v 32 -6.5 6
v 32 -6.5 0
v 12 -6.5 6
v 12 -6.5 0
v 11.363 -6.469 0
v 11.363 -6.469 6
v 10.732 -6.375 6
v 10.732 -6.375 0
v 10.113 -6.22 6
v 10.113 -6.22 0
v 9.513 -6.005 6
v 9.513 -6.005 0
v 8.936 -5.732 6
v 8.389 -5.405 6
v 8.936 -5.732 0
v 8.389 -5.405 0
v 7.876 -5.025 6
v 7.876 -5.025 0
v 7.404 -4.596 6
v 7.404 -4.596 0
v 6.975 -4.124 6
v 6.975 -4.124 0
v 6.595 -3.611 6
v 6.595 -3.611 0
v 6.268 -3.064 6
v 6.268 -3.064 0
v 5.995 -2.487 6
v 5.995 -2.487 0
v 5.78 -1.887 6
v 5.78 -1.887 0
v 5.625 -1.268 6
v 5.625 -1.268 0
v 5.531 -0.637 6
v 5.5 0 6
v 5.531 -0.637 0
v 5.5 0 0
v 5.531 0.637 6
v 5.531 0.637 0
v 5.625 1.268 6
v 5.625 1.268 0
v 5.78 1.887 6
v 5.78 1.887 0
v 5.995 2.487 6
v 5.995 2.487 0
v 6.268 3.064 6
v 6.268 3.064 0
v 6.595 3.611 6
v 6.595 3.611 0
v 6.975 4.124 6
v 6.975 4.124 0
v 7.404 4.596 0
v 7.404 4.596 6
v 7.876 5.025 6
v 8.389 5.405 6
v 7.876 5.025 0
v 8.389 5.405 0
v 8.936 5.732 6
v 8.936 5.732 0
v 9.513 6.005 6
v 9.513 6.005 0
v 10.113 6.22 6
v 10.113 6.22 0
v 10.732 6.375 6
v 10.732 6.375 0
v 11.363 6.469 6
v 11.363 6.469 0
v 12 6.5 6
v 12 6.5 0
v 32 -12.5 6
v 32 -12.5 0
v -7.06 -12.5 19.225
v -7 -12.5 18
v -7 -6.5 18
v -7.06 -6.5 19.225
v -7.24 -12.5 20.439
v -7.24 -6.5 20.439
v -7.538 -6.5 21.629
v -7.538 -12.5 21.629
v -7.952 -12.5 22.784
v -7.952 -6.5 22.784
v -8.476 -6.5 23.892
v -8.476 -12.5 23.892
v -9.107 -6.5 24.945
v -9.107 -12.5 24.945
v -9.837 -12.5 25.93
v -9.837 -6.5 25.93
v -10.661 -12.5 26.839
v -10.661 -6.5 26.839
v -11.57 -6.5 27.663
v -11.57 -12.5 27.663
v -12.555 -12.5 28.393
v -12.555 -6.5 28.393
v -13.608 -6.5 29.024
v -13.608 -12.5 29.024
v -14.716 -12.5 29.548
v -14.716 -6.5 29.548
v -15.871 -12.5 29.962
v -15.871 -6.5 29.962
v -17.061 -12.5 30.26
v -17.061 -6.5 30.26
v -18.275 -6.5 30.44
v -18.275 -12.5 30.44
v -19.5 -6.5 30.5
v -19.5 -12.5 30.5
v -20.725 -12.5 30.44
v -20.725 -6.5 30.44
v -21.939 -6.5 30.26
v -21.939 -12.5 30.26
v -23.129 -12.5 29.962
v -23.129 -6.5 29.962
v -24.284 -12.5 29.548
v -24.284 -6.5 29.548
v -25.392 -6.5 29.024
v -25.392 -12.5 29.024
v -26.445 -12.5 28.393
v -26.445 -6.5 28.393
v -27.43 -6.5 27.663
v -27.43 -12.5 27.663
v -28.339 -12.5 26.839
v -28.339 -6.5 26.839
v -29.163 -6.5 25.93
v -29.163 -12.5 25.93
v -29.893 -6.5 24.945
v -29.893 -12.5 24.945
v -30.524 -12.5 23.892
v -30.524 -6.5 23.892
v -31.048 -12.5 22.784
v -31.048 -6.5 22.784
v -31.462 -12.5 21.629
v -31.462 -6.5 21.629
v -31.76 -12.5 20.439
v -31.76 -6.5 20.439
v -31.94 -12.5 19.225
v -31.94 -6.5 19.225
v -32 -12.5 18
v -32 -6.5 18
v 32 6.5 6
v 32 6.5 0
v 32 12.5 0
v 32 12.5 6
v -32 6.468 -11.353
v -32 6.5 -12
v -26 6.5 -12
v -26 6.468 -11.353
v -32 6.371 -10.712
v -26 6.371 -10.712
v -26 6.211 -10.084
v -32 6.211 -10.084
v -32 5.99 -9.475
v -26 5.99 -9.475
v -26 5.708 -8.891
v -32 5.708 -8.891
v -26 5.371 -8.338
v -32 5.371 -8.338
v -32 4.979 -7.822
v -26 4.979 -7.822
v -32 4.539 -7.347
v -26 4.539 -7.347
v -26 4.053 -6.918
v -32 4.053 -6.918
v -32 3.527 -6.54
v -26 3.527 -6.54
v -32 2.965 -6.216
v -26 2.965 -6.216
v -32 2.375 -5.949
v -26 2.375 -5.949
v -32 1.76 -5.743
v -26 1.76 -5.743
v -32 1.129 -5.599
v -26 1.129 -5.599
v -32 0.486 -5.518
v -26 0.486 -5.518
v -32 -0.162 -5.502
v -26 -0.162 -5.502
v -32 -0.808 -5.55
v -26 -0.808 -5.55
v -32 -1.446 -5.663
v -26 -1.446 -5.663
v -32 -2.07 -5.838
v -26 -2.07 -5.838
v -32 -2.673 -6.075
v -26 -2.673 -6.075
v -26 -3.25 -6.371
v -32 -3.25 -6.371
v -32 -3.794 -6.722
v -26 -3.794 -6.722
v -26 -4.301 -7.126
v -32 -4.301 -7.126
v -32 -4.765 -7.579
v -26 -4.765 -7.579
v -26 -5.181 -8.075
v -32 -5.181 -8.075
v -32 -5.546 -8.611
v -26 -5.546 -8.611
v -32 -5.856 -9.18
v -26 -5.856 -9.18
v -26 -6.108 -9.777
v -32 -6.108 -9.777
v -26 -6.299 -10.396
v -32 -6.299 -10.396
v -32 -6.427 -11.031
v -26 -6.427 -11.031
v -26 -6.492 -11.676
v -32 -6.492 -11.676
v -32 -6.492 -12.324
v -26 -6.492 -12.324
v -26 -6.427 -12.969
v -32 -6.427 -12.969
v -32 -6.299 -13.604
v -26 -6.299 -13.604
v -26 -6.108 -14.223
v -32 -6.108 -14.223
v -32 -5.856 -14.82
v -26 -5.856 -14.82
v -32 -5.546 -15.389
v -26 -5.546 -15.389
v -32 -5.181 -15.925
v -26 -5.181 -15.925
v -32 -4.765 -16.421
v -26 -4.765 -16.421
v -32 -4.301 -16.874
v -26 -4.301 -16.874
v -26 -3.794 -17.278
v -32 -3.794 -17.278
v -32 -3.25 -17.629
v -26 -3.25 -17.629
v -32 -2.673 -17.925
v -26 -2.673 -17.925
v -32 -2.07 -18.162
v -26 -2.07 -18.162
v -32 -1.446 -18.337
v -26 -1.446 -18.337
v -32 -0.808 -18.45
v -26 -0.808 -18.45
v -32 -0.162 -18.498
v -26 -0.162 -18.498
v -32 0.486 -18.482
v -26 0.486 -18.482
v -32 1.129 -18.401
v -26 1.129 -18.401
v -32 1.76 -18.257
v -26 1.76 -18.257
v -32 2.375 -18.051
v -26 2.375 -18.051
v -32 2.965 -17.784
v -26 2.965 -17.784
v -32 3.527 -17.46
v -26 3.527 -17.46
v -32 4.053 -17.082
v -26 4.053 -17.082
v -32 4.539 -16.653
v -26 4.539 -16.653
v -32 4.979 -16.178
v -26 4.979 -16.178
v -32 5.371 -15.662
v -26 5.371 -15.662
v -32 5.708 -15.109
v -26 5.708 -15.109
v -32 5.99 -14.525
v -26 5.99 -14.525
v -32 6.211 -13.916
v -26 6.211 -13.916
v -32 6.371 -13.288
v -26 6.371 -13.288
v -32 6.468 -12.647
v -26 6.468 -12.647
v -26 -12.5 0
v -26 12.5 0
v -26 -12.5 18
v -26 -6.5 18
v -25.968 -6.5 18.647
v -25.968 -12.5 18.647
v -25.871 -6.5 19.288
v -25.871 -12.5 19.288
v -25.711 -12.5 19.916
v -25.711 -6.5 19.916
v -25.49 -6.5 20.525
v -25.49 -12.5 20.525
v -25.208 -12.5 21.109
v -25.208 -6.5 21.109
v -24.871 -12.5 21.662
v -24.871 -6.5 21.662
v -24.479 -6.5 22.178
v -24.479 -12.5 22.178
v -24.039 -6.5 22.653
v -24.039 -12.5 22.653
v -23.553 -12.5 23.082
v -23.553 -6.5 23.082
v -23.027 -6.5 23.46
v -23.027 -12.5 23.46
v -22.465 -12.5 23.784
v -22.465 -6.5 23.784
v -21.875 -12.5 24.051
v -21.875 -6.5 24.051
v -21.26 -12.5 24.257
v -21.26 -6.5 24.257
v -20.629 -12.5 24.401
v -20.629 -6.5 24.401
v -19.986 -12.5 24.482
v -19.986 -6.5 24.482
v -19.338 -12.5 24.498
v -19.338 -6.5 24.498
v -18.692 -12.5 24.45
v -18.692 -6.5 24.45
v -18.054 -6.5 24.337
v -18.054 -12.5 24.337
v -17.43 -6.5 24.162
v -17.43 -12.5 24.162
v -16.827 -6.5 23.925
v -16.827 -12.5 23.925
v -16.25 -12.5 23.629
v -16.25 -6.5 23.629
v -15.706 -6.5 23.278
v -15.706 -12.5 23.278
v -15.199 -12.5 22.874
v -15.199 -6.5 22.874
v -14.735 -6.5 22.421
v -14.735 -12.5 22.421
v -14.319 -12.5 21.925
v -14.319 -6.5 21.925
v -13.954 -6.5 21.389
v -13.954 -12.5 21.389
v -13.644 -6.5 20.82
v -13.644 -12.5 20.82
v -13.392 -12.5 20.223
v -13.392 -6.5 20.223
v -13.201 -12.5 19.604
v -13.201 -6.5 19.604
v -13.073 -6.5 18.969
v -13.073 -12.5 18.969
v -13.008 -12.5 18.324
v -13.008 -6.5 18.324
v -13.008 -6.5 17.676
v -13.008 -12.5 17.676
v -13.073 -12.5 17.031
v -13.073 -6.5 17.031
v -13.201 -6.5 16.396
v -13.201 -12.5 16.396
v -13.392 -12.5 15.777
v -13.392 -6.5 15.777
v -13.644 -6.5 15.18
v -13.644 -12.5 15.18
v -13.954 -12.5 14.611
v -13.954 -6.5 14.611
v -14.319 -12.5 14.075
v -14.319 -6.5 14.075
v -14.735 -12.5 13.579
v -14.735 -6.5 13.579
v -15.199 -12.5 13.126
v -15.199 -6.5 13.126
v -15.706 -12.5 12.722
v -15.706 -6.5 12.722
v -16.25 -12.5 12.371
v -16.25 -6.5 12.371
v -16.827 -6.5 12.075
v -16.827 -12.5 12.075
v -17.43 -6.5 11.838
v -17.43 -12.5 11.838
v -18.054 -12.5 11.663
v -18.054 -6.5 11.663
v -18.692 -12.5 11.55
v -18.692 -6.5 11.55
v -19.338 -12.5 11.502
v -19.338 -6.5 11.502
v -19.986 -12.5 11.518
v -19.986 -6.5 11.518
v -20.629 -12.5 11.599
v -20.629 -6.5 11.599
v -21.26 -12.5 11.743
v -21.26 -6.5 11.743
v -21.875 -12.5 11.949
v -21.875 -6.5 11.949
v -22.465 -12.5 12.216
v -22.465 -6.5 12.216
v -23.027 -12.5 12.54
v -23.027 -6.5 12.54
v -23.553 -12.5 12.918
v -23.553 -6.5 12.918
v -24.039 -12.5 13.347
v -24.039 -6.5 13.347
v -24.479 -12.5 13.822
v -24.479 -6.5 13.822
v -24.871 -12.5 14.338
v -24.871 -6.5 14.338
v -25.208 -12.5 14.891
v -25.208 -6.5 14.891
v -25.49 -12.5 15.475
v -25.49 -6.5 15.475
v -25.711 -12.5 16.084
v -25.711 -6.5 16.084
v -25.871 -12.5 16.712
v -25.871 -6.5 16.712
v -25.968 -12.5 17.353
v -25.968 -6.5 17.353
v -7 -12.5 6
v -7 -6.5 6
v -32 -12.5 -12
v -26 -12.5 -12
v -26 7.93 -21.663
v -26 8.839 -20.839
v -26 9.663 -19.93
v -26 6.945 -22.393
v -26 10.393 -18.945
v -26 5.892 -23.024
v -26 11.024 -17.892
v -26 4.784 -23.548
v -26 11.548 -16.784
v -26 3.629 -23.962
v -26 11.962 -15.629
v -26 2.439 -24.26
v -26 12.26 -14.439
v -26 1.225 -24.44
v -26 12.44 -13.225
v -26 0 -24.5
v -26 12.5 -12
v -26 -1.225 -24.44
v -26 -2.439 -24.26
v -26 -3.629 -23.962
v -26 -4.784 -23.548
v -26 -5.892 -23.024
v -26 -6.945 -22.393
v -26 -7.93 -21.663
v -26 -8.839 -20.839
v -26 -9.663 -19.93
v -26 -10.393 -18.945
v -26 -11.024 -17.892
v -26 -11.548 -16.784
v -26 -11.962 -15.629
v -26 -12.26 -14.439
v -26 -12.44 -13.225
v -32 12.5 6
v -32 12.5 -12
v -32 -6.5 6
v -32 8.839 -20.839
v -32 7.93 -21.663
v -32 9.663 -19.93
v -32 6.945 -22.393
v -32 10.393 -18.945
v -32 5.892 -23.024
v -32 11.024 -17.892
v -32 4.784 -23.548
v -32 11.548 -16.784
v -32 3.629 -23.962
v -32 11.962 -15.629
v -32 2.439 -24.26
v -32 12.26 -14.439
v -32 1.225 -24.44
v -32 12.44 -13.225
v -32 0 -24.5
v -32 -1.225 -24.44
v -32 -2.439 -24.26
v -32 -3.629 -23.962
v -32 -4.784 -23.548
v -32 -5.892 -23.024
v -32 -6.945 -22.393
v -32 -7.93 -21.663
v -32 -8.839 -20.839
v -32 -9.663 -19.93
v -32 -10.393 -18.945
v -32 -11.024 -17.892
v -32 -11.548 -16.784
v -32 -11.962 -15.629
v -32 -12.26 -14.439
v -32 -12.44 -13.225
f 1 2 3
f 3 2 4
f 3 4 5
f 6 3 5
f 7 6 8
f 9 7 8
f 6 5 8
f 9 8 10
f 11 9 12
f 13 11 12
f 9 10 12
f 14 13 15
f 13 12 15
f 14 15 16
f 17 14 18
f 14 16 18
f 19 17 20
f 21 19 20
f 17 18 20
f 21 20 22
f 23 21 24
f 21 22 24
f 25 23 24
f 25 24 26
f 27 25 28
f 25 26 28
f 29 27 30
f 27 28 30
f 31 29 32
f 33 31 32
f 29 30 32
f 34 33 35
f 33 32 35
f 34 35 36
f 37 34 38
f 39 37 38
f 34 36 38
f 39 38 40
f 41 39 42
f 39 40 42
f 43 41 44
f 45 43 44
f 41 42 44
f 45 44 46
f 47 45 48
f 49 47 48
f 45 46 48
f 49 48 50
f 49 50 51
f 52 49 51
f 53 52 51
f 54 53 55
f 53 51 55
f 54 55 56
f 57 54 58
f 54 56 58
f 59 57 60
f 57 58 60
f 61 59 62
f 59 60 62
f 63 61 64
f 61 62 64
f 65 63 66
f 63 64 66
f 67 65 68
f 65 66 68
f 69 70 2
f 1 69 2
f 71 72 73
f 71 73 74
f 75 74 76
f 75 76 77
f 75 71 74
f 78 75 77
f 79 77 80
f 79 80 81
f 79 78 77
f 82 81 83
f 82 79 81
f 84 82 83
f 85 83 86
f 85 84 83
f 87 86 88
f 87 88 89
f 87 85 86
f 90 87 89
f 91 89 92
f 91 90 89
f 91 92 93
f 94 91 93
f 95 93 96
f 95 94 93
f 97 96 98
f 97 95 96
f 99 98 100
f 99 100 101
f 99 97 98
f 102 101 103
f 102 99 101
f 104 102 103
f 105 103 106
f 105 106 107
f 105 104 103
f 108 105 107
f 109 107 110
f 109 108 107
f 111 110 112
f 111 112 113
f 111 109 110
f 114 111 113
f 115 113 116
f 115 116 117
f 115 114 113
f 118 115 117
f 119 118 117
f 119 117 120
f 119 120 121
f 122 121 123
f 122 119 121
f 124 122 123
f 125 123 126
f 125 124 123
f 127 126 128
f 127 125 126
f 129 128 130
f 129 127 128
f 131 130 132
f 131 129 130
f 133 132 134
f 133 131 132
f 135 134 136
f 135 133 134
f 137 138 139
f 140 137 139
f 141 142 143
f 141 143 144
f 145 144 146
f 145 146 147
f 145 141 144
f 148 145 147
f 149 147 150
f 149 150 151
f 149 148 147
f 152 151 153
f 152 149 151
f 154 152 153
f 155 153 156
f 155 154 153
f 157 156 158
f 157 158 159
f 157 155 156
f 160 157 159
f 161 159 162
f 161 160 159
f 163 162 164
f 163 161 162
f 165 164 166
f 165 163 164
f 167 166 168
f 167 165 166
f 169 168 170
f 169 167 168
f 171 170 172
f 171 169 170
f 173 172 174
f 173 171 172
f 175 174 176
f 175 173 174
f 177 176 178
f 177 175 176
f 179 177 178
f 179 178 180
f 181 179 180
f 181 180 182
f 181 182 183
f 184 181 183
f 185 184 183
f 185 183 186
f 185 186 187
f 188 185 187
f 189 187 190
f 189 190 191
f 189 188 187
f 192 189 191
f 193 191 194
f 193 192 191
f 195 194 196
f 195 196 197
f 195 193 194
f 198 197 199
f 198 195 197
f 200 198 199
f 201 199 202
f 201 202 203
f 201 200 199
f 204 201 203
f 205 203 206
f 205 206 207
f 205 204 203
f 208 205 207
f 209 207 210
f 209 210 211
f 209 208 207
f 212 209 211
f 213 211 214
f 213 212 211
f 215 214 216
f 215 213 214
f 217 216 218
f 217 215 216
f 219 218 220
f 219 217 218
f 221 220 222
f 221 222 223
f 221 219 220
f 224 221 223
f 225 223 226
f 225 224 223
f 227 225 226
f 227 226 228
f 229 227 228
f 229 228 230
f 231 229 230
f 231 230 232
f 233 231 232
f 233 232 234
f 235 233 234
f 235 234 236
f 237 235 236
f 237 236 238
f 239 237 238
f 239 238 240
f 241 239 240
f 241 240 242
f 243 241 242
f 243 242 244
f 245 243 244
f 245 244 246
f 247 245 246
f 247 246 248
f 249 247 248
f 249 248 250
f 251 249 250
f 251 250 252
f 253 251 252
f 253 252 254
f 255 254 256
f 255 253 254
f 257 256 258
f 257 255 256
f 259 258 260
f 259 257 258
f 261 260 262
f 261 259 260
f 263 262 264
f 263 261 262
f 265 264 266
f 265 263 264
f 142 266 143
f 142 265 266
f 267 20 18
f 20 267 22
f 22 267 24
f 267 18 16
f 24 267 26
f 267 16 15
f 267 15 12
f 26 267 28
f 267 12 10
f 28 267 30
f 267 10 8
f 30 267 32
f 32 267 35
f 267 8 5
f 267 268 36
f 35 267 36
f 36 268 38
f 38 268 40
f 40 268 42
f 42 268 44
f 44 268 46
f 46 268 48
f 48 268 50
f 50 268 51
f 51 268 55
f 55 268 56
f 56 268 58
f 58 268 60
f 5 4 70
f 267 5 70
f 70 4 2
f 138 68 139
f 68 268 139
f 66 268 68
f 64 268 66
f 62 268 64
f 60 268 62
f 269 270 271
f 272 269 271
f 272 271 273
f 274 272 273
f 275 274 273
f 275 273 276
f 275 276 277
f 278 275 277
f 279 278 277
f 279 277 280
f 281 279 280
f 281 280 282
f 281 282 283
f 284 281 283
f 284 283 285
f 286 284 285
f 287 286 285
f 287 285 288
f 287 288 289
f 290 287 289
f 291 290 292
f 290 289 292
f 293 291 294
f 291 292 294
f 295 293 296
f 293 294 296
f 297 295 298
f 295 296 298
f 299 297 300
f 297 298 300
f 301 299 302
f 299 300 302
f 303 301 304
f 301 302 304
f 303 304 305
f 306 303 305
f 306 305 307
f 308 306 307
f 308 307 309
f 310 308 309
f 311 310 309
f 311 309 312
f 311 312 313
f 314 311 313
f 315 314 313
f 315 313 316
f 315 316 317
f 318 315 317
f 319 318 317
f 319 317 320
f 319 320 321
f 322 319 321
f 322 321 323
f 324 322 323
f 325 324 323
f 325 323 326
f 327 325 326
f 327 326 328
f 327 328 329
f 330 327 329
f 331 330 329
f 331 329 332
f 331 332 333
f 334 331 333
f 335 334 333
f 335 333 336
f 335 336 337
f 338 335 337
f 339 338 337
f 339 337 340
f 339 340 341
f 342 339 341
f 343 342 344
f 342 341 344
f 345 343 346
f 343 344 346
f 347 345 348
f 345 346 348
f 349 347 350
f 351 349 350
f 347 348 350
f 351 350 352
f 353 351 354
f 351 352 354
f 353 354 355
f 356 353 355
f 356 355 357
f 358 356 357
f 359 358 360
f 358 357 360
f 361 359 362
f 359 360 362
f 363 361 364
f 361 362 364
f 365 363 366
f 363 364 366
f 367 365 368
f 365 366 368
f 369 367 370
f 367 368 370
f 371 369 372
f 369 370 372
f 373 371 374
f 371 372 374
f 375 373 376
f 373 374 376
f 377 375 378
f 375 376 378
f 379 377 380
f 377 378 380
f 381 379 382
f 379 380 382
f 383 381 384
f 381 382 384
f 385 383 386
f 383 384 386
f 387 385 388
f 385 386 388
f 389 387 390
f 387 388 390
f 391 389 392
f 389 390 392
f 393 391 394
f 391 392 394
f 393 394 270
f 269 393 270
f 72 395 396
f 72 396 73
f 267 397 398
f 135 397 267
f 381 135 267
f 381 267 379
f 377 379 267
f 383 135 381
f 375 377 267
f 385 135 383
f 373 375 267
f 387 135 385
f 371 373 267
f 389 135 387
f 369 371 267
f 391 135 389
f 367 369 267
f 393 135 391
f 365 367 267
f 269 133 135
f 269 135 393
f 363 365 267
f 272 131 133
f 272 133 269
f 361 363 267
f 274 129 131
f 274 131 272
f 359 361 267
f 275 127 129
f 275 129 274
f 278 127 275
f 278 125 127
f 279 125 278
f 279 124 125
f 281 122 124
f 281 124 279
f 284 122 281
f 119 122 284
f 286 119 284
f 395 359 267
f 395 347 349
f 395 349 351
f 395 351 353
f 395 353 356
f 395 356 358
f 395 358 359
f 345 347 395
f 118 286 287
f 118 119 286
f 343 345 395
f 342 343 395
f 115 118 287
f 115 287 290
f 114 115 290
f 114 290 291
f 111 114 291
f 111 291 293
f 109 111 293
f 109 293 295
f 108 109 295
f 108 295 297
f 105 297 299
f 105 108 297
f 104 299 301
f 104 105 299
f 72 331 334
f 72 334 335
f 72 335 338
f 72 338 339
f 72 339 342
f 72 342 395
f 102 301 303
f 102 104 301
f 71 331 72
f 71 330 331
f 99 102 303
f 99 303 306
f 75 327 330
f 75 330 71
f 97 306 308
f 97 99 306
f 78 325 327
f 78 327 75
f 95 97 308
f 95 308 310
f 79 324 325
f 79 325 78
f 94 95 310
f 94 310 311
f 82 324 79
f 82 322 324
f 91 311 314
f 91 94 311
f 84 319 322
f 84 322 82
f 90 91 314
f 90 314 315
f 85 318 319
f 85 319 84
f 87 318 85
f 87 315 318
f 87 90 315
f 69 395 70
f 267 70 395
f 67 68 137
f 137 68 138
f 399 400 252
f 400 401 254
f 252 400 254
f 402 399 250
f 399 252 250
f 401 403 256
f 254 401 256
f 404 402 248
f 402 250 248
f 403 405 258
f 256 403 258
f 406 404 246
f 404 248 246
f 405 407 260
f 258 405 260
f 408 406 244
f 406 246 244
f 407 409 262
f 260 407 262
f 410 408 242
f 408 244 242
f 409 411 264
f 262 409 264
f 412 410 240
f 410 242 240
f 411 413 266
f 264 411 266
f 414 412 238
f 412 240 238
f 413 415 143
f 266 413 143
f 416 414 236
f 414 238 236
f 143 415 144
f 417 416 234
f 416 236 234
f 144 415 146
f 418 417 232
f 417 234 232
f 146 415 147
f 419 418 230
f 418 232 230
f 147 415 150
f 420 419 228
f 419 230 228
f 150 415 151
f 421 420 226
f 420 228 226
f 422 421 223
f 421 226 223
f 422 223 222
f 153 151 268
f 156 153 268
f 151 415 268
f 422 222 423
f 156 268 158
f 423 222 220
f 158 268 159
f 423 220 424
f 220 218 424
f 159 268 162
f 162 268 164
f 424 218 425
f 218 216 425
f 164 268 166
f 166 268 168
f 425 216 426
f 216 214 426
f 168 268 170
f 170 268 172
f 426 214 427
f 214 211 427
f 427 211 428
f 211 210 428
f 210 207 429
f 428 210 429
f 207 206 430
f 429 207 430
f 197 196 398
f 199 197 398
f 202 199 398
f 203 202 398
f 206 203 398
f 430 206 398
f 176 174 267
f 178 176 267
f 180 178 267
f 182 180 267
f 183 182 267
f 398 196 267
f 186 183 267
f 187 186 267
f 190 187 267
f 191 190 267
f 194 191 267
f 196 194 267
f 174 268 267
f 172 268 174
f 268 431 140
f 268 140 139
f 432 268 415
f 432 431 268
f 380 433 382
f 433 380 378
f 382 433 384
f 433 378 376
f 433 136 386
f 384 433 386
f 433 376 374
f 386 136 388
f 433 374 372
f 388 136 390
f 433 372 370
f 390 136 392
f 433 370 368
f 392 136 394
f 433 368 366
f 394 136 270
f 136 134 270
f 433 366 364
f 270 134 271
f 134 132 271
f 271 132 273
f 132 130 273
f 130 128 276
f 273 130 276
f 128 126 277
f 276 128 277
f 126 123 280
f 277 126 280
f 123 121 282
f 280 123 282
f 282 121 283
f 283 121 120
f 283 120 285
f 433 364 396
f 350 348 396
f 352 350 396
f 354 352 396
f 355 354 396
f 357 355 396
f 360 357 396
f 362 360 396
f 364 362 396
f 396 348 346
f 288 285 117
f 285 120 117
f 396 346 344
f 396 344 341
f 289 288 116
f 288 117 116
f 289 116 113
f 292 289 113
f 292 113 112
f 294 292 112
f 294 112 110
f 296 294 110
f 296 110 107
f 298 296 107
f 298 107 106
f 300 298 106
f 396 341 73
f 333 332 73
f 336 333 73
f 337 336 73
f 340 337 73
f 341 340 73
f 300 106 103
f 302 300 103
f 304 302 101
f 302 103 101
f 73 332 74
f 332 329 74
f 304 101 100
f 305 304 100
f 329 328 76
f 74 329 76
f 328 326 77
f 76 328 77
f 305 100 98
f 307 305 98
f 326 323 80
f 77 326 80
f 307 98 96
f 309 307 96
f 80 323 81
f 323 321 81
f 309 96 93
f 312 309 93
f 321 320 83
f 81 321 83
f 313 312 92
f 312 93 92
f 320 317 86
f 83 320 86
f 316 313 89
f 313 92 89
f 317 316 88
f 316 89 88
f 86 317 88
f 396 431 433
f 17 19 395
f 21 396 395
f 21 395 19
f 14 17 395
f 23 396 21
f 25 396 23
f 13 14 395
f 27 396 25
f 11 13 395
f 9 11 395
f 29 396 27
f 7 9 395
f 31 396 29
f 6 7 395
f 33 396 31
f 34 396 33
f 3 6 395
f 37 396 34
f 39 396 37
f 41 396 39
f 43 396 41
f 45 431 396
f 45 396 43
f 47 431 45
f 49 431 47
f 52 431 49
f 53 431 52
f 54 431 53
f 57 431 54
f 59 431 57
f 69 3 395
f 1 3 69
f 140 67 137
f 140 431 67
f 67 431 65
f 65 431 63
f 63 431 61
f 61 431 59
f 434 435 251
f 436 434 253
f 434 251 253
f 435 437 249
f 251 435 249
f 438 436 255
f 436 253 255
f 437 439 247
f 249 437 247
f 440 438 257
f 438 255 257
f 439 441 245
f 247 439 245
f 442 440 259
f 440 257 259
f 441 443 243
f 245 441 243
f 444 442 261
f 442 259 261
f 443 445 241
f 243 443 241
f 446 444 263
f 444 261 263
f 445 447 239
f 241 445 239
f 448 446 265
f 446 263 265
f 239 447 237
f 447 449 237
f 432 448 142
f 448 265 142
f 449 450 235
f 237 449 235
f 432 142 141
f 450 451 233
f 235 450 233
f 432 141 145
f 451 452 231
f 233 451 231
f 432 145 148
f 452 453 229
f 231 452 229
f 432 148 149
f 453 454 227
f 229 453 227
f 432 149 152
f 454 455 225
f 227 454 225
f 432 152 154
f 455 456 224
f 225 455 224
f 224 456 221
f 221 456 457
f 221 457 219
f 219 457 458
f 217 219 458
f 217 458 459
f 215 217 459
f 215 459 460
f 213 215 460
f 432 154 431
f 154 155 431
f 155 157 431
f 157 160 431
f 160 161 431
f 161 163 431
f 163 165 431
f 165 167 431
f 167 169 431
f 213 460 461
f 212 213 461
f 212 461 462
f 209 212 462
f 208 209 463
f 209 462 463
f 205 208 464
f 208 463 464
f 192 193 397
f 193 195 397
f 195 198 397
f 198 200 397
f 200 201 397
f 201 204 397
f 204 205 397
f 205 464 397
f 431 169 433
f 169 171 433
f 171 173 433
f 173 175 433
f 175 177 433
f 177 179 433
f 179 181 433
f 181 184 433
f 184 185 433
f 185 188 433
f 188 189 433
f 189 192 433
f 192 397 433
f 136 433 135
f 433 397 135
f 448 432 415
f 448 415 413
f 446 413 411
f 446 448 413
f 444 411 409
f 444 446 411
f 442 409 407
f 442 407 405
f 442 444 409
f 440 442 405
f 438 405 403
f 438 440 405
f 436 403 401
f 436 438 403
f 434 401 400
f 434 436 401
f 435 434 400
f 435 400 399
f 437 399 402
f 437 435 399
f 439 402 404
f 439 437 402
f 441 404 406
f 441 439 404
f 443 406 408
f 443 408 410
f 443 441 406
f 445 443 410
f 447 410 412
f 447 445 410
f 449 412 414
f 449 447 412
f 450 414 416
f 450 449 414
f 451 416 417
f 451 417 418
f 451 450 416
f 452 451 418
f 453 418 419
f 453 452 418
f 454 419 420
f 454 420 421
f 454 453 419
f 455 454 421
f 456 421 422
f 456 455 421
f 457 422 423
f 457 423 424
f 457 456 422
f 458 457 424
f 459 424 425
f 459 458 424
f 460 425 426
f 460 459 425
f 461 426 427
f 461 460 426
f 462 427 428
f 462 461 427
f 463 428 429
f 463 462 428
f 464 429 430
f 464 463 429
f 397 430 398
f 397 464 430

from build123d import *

# Parameters (mm, degrees)
F1_DEPTH = 6
F3_DEPTH = 6
F4_W     = 25
F4_H     = 12
F5_DEPTH = 6
F6_D     = 13


with BuildPart() as f1:
    # F0 (on Top) → F1 (new body)
    with BuildSketch(Plane.XY):
        with BuildLine():
            Line((-32, -12.5), (32, -12.5))
            Line((32, -12.5), (32, -6.5))
            Line((32, -6.5), (12, -6.5))
            ThreePointArc((12, -6.5), (5.5, 0), (12, 6.5))
            Line((12, 6.5), (32, 6.5))
            Line((32, 6.5), (32, 12.5))
            Line((32, 12.5), (-32, 12.5))
            Line((-32, 12.5), (-32, -12.5))
        make_face()
    extrude(amount=F1_DEPTH)

    # F2 (on face) → F3 (join)
    with BuildSketch(Plane(origin=(-32, 0, 0), x_dir=(0, -1, 0), z_dir=(-1, 0, 0))):
        with BuildLine():
            ThreePointArc((-12.5, -12), (0, -24.5), (12.5, -12))
            Line((12.5, -12), (6.5, -12))
            ThreePointArc((6.5, -12), (0, -18.5), (-6.5, -12))
            Line((-6.5, -12), (-12.5, -12))
        make_face()
        with BuildLine():
            Line((6.5, -12), (12.5, -12))
            ThreePointArc((12.5, -12), (10, -4.5), (3.5, 0))
            Line((3.5, 0), (-3.5, 0))
            ThreePointArc((-3.5, 0), (-10, -4.5), (-12.5, -12))
            Line((-12.5, -12), (-6.5, -12))
            ThreePointArc((-6.5, -12), (0, -5.5), (6.5, -12))
        make_face()
        with BuildLine():
            Line((12.5, -12), (12.5, 0))
            Line((12.5, 0), (3.5, 0))
            ThreePointArc((3.5, 0), (10, -4.5), (12.5, -12))
        make_face()
        with BuildLine():
            Line((-3.5, 0), (-12.5, 0))
            Line((-12.5, 0), (-12.5, -12))
            ThreePointArc((-12.5, -12), (-10, -4.5), (-3.5, 0))
        make_face()
    extrude(amount=-F3_DEPTH)

    # F4 (on face) → F5 (join)
    with BuildSketch(Plane.XZ.offset(12.5)):
        with Locations((-19.5, 12)):
            Rectangle(F4_W, F4_H)
        with BuildLine():
            ThreePointArc((-7, 18), (-19.5, 30.5), (-32, 18))
            Line((-32, 18), (-7, 18))
        make_face()
    extrude(amount=-F5_DEPTH)

    # F6 (through all)
    with Locations(Plane.XZ.offset(12.5)):
        with Locations((-19.5, 18)):
            Hole(F6_D / 2)


solid = f1.part
